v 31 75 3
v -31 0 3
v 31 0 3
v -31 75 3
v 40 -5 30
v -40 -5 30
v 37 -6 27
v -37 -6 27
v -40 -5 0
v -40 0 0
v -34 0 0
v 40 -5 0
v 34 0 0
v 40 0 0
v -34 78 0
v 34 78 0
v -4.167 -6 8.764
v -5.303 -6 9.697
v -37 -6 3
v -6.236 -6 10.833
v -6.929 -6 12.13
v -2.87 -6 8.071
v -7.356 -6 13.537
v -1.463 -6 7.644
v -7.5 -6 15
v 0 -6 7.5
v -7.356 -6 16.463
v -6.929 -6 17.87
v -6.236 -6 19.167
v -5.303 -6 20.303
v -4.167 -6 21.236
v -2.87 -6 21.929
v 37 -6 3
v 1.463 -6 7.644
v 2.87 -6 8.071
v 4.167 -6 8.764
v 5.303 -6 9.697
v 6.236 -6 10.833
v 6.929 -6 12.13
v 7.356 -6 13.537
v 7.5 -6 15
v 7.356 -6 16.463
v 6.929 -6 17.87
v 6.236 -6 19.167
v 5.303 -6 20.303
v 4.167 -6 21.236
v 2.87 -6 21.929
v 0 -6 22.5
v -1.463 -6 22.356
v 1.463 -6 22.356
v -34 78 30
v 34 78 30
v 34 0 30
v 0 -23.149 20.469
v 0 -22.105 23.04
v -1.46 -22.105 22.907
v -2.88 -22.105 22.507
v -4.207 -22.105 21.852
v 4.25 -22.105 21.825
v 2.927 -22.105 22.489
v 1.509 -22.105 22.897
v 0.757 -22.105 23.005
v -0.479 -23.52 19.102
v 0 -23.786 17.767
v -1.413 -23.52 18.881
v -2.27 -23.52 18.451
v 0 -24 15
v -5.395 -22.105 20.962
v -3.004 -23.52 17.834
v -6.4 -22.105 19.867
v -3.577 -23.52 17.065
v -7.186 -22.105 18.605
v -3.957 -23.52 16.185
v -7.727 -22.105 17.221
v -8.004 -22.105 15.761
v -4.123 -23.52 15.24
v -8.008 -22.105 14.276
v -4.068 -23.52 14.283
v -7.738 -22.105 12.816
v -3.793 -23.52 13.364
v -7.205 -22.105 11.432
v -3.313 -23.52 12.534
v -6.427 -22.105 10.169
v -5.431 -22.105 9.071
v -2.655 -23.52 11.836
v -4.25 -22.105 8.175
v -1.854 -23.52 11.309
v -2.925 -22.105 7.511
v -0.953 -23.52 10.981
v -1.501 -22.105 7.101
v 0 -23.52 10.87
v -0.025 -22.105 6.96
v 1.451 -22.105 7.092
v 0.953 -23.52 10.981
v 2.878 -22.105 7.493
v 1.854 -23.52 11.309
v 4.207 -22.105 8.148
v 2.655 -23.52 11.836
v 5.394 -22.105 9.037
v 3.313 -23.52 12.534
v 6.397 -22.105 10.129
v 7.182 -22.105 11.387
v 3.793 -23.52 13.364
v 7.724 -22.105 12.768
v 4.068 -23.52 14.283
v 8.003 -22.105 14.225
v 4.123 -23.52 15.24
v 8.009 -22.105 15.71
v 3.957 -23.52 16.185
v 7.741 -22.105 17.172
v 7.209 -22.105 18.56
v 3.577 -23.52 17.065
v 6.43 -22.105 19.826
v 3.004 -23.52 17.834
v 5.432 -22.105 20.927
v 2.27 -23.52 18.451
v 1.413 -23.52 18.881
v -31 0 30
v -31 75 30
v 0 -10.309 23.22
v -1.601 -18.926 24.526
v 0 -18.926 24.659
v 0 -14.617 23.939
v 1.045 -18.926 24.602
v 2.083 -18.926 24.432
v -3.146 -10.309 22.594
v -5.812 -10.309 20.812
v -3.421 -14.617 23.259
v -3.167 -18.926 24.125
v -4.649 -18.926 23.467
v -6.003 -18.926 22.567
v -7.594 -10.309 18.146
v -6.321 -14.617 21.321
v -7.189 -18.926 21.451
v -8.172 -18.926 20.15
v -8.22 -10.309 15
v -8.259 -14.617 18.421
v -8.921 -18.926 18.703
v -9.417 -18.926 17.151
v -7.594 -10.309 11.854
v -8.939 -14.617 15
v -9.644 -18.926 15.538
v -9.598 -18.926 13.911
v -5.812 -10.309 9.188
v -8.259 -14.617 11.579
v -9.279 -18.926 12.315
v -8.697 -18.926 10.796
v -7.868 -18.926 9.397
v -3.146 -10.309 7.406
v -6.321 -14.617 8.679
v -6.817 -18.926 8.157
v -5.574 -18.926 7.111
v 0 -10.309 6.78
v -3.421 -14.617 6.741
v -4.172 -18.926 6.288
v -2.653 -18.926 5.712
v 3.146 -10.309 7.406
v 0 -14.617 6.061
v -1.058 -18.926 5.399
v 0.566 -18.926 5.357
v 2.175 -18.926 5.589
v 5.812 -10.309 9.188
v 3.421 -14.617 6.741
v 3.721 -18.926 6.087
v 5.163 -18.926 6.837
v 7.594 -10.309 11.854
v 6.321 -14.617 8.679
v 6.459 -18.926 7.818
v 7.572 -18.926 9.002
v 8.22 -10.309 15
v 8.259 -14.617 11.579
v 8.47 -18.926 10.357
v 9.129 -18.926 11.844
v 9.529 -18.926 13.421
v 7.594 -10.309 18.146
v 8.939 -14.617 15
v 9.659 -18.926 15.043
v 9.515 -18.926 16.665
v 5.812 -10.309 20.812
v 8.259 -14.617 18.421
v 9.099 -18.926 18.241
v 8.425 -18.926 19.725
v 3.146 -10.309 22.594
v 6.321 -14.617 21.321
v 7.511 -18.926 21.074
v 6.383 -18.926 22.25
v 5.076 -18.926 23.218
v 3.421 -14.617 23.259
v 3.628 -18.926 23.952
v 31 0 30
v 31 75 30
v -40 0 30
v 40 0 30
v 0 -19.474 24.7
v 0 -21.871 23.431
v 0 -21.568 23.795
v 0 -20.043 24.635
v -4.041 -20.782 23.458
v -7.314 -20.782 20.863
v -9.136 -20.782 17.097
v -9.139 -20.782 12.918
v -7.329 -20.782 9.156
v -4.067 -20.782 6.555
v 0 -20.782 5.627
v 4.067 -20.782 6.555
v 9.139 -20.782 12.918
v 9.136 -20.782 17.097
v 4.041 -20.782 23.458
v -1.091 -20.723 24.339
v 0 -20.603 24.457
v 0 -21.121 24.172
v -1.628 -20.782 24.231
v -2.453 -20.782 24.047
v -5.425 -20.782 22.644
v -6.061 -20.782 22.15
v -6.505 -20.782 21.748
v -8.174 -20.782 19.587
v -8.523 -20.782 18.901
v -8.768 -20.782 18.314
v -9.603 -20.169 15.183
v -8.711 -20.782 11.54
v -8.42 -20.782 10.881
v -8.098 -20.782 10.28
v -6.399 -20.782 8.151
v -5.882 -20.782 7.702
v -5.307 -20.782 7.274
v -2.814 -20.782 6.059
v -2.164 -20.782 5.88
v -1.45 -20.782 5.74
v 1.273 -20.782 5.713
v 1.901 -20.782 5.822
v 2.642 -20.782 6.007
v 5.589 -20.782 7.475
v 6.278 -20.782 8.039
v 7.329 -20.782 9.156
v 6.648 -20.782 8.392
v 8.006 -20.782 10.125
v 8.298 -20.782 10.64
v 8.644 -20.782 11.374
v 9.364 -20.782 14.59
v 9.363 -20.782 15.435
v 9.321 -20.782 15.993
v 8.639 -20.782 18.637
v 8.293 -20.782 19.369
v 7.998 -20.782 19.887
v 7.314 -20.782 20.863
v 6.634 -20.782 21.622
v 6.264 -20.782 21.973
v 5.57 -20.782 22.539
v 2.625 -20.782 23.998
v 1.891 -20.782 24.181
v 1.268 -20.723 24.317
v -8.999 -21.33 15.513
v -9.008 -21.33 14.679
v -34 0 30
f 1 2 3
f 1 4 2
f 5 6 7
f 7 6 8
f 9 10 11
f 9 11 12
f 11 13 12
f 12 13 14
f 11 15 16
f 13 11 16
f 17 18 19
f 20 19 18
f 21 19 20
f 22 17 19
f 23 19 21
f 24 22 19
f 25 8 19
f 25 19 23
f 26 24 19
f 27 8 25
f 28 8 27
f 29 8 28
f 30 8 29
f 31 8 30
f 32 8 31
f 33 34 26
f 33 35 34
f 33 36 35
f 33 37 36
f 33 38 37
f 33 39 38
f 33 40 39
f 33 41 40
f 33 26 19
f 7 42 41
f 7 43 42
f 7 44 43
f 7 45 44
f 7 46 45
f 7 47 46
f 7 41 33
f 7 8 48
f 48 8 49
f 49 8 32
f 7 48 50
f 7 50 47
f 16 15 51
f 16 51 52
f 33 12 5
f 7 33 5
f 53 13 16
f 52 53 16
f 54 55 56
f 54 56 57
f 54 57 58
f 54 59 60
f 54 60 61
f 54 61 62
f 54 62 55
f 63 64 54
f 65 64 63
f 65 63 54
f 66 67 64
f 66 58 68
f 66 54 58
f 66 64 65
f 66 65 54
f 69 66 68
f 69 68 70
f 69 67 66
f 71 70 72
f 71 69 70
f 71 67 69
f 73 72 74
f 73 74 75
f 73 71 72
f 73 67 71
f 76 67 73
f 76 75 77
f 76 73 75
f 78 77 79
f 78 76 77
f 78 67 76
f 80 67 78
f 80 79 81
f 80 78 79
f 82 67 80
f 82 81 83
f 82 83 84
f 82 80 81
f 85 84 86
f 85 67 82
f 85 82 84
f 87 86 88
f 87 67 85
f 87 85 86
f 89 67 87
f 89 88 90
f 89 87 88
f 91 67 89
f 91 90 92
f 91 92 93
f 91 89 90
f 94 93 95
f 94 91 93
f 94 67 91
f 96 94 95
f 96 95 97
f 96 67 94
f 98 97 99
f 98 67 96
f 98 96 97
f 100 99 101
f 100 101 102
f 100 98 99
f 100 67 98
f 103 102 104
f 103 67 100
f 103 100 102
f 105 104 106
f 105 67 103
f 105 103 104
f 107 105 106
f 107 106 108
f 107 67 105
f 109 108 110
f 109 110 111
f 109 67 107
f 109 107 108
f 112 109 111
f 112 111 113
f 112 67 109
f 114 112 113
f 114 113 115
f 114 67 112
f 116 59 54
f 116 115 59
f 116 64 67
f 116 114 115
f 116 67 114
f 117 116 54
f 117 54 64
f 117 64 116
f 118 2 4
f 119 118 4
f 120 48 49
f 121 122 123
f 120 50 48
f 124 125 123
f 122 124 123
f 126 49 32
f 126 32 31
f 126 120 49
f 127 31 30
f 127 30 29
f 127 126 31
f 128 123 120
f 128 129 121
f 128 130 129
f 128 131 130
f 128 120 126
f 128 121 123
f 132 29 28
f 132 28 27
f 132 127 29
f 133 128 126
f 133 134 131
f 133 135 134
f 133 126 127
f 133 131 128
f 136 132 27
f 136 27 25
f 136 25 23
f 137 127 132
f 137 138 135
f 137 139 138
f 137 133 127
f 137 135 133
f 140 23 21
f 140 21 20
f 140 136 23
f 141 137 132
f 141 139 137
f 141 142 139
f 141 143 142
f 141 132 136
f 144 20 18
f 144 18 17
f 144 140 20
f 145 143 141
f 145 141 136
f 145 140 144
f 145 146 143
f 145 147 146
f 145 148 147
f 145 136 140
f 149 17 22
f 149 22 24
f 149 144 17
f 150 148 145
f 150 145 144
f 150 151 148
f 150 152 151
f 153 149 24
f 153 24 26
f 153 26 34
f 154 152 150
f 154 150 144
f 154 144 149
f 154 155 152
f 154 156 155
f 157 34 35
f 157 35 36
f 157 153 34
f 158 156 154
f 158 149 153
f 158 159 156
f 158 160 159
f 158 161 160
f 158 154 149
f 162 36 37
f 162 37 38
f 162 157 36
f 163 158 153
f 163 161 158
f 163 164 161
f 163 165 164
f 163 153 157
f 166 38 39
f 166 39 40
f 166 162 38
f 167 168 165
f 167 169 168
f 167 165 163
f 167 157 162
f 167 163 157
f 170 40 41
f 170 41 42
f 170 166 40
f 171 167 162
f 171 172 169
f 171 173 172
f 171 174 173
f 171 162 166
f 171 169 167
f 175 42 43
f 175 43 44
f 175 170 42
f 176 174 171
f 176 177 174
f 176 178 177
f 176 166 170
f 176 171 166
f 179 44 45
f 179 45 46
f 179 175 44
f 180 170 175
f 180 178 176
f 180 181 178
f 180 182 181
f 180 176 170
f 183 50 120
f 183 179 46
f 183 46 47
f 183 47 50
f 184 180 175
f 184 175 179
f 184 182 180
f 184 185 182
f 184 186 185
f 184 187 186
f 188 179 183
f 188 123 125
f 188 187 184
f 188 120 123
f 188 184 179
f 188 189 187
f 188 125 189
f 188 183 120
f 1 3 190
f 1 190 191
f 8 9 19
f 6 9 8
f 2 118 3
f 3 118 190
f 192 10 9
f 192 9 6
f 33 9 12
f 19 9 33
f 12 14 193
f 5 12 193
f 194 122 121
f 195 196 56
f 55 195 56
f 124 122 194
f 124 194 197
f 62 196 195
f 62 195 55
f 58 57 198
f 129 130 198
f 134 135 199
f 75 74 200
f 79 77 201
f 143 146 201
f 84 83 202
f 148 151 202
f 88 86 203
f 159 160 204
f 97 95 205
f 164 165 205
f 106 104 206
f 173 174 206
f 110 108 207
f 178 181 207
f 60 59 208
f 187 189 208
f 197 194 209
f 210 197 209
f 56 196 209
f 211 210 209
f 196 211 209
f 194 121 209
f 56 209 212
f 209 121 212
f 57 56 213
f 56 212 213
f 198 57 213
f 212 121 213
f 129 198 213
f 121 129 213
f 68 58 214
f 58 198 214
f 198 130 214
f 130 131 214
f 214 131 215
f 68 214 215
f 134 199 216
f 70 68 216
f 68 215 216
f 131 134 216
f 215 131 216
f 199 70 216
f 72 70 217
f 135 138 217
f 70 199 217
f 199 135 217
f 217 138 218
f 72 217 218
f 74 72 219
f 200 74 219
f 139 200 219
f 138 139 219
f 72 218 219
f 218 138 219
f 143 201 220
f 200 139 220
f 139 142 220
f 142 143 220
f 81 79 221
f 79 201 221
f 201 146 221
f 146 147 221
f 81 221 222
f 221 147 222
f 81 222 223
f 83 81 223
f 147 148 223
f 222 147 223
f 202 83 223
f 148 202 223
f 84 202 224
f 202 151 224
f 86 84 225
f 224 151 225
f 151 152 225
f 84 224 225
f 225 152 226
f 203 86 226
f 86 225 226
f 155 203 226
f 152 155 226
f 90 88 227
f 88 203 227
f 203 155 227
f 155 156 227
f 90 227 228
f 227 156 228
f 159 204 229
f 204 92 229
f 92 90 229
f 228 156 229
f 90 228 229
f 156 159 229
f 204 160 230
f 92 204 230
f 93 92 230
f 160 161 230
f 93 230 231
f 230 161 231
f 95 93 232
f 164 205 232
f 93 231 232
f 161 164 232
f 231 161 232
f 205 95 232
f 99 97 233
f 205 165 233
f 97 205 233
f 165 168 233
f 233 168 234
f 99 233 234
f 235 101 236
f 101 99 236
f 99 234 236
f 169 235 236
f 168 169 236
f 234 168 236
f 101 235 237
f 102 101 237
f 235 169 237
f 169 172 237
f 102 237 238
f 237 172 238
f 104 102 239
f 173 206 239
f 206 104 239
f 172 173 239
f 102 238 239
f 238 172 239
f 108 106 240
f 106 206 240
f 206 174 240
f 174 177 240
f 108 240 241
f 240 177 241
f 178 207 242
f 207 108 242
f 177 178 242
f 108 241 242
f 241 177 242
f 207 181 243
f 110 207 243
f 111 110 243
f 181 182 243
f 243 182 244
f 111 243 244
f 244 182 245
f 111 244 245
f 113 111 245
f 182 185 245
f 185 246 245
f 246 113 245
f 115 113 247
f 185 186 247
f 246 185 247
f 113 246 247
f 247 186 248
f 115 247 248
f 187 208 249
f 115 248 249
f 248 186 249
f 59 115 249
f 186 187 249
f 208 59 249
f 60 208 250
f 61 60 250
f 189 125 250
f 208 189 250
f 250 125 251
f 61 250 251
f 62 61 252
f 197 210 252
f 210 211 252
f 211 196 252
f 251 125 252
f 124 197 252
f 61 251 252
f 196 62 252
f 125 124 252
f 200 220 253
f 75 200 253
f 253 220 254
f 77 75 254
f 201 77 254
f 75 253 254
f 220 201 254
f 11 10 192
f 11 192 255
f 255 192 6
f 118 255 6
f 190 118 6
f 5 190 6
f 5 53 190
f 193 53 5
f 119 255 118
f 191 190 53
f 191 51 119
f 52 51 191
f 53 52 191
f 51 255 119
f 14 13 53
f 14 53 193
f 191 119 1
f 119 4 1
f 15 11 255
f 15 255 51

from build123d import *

# Parameters (mm, degrees)
F0_W     = 68
F0_H     = 78
F1_DEPTH = 30
F2_T     = -3
F3_W     = 80
F3_H     = 30
F4_DEPTH = 6
F5_SIZE2 = 1
F5_SIZE  = 3
F8_R     = 3


with BuildPart() as f1:
    # F0 (on Top) → F1 (new body)
    with BuildSketch(Plane.XY):
        with Locations((0, 39)):
            Rectangle(F0_W, F0_H)
    extrude(amount=F1_DEPTH)

    # F2
    f2_openings = [f1.faces().sort_by_distance(p)[0] for p in [
        (0, 39, 30),
        (0, 0, 15),
    ]]
    offset(amount=F2_T, openings=f2_openings)

    # F3 (on Front) → F4 (join)
    with BuildSketch(Plane.XZ):
        with Locations((0, 15)):
            Rectangle(F3_W, F3_H)
    extrude(amount=F4_DEPTH)

    # F5
    f5_edges = [f1.edges().sort_by_distance(p)[0] for p in [
        (0, -6, 30),
        (-40, -6, 15),
        (0, -6, 0),
        (40, -6, 15),
    ]]
    f5_side = f1.faces().sort_by_distance((0, -6, 15))[0]
    chamfer(f5_edges, length=F5_SIZE, length2=F5_SIZE2, reference=f5_side)

    # F6 (on Right) → F7 (revolve)
    with BuildSketch(Plane.YZ):
        with BuildLine():
            ThreePointArc((-20.9666295471, 25), (-23.2249721603, 20.2249721603), (-24, 15))
            Line((-24, 15), (-6, 15))
            Line((-6, 15), (-6, 22.5))
            Line((-6, 22.5), (-20.9666295471, 25))
        make_face()
    revolve(axis=Axis((0, -21.969004482, 15), (0, -1, 0)))

    # F8
    f8_edges = [f1.edges().sort_by_distance(p)[0] for p in [
        (0, -20.96663, 5),
    ]]
    fillet(f8_edges, radius=F8_R)


solid = f1.part
